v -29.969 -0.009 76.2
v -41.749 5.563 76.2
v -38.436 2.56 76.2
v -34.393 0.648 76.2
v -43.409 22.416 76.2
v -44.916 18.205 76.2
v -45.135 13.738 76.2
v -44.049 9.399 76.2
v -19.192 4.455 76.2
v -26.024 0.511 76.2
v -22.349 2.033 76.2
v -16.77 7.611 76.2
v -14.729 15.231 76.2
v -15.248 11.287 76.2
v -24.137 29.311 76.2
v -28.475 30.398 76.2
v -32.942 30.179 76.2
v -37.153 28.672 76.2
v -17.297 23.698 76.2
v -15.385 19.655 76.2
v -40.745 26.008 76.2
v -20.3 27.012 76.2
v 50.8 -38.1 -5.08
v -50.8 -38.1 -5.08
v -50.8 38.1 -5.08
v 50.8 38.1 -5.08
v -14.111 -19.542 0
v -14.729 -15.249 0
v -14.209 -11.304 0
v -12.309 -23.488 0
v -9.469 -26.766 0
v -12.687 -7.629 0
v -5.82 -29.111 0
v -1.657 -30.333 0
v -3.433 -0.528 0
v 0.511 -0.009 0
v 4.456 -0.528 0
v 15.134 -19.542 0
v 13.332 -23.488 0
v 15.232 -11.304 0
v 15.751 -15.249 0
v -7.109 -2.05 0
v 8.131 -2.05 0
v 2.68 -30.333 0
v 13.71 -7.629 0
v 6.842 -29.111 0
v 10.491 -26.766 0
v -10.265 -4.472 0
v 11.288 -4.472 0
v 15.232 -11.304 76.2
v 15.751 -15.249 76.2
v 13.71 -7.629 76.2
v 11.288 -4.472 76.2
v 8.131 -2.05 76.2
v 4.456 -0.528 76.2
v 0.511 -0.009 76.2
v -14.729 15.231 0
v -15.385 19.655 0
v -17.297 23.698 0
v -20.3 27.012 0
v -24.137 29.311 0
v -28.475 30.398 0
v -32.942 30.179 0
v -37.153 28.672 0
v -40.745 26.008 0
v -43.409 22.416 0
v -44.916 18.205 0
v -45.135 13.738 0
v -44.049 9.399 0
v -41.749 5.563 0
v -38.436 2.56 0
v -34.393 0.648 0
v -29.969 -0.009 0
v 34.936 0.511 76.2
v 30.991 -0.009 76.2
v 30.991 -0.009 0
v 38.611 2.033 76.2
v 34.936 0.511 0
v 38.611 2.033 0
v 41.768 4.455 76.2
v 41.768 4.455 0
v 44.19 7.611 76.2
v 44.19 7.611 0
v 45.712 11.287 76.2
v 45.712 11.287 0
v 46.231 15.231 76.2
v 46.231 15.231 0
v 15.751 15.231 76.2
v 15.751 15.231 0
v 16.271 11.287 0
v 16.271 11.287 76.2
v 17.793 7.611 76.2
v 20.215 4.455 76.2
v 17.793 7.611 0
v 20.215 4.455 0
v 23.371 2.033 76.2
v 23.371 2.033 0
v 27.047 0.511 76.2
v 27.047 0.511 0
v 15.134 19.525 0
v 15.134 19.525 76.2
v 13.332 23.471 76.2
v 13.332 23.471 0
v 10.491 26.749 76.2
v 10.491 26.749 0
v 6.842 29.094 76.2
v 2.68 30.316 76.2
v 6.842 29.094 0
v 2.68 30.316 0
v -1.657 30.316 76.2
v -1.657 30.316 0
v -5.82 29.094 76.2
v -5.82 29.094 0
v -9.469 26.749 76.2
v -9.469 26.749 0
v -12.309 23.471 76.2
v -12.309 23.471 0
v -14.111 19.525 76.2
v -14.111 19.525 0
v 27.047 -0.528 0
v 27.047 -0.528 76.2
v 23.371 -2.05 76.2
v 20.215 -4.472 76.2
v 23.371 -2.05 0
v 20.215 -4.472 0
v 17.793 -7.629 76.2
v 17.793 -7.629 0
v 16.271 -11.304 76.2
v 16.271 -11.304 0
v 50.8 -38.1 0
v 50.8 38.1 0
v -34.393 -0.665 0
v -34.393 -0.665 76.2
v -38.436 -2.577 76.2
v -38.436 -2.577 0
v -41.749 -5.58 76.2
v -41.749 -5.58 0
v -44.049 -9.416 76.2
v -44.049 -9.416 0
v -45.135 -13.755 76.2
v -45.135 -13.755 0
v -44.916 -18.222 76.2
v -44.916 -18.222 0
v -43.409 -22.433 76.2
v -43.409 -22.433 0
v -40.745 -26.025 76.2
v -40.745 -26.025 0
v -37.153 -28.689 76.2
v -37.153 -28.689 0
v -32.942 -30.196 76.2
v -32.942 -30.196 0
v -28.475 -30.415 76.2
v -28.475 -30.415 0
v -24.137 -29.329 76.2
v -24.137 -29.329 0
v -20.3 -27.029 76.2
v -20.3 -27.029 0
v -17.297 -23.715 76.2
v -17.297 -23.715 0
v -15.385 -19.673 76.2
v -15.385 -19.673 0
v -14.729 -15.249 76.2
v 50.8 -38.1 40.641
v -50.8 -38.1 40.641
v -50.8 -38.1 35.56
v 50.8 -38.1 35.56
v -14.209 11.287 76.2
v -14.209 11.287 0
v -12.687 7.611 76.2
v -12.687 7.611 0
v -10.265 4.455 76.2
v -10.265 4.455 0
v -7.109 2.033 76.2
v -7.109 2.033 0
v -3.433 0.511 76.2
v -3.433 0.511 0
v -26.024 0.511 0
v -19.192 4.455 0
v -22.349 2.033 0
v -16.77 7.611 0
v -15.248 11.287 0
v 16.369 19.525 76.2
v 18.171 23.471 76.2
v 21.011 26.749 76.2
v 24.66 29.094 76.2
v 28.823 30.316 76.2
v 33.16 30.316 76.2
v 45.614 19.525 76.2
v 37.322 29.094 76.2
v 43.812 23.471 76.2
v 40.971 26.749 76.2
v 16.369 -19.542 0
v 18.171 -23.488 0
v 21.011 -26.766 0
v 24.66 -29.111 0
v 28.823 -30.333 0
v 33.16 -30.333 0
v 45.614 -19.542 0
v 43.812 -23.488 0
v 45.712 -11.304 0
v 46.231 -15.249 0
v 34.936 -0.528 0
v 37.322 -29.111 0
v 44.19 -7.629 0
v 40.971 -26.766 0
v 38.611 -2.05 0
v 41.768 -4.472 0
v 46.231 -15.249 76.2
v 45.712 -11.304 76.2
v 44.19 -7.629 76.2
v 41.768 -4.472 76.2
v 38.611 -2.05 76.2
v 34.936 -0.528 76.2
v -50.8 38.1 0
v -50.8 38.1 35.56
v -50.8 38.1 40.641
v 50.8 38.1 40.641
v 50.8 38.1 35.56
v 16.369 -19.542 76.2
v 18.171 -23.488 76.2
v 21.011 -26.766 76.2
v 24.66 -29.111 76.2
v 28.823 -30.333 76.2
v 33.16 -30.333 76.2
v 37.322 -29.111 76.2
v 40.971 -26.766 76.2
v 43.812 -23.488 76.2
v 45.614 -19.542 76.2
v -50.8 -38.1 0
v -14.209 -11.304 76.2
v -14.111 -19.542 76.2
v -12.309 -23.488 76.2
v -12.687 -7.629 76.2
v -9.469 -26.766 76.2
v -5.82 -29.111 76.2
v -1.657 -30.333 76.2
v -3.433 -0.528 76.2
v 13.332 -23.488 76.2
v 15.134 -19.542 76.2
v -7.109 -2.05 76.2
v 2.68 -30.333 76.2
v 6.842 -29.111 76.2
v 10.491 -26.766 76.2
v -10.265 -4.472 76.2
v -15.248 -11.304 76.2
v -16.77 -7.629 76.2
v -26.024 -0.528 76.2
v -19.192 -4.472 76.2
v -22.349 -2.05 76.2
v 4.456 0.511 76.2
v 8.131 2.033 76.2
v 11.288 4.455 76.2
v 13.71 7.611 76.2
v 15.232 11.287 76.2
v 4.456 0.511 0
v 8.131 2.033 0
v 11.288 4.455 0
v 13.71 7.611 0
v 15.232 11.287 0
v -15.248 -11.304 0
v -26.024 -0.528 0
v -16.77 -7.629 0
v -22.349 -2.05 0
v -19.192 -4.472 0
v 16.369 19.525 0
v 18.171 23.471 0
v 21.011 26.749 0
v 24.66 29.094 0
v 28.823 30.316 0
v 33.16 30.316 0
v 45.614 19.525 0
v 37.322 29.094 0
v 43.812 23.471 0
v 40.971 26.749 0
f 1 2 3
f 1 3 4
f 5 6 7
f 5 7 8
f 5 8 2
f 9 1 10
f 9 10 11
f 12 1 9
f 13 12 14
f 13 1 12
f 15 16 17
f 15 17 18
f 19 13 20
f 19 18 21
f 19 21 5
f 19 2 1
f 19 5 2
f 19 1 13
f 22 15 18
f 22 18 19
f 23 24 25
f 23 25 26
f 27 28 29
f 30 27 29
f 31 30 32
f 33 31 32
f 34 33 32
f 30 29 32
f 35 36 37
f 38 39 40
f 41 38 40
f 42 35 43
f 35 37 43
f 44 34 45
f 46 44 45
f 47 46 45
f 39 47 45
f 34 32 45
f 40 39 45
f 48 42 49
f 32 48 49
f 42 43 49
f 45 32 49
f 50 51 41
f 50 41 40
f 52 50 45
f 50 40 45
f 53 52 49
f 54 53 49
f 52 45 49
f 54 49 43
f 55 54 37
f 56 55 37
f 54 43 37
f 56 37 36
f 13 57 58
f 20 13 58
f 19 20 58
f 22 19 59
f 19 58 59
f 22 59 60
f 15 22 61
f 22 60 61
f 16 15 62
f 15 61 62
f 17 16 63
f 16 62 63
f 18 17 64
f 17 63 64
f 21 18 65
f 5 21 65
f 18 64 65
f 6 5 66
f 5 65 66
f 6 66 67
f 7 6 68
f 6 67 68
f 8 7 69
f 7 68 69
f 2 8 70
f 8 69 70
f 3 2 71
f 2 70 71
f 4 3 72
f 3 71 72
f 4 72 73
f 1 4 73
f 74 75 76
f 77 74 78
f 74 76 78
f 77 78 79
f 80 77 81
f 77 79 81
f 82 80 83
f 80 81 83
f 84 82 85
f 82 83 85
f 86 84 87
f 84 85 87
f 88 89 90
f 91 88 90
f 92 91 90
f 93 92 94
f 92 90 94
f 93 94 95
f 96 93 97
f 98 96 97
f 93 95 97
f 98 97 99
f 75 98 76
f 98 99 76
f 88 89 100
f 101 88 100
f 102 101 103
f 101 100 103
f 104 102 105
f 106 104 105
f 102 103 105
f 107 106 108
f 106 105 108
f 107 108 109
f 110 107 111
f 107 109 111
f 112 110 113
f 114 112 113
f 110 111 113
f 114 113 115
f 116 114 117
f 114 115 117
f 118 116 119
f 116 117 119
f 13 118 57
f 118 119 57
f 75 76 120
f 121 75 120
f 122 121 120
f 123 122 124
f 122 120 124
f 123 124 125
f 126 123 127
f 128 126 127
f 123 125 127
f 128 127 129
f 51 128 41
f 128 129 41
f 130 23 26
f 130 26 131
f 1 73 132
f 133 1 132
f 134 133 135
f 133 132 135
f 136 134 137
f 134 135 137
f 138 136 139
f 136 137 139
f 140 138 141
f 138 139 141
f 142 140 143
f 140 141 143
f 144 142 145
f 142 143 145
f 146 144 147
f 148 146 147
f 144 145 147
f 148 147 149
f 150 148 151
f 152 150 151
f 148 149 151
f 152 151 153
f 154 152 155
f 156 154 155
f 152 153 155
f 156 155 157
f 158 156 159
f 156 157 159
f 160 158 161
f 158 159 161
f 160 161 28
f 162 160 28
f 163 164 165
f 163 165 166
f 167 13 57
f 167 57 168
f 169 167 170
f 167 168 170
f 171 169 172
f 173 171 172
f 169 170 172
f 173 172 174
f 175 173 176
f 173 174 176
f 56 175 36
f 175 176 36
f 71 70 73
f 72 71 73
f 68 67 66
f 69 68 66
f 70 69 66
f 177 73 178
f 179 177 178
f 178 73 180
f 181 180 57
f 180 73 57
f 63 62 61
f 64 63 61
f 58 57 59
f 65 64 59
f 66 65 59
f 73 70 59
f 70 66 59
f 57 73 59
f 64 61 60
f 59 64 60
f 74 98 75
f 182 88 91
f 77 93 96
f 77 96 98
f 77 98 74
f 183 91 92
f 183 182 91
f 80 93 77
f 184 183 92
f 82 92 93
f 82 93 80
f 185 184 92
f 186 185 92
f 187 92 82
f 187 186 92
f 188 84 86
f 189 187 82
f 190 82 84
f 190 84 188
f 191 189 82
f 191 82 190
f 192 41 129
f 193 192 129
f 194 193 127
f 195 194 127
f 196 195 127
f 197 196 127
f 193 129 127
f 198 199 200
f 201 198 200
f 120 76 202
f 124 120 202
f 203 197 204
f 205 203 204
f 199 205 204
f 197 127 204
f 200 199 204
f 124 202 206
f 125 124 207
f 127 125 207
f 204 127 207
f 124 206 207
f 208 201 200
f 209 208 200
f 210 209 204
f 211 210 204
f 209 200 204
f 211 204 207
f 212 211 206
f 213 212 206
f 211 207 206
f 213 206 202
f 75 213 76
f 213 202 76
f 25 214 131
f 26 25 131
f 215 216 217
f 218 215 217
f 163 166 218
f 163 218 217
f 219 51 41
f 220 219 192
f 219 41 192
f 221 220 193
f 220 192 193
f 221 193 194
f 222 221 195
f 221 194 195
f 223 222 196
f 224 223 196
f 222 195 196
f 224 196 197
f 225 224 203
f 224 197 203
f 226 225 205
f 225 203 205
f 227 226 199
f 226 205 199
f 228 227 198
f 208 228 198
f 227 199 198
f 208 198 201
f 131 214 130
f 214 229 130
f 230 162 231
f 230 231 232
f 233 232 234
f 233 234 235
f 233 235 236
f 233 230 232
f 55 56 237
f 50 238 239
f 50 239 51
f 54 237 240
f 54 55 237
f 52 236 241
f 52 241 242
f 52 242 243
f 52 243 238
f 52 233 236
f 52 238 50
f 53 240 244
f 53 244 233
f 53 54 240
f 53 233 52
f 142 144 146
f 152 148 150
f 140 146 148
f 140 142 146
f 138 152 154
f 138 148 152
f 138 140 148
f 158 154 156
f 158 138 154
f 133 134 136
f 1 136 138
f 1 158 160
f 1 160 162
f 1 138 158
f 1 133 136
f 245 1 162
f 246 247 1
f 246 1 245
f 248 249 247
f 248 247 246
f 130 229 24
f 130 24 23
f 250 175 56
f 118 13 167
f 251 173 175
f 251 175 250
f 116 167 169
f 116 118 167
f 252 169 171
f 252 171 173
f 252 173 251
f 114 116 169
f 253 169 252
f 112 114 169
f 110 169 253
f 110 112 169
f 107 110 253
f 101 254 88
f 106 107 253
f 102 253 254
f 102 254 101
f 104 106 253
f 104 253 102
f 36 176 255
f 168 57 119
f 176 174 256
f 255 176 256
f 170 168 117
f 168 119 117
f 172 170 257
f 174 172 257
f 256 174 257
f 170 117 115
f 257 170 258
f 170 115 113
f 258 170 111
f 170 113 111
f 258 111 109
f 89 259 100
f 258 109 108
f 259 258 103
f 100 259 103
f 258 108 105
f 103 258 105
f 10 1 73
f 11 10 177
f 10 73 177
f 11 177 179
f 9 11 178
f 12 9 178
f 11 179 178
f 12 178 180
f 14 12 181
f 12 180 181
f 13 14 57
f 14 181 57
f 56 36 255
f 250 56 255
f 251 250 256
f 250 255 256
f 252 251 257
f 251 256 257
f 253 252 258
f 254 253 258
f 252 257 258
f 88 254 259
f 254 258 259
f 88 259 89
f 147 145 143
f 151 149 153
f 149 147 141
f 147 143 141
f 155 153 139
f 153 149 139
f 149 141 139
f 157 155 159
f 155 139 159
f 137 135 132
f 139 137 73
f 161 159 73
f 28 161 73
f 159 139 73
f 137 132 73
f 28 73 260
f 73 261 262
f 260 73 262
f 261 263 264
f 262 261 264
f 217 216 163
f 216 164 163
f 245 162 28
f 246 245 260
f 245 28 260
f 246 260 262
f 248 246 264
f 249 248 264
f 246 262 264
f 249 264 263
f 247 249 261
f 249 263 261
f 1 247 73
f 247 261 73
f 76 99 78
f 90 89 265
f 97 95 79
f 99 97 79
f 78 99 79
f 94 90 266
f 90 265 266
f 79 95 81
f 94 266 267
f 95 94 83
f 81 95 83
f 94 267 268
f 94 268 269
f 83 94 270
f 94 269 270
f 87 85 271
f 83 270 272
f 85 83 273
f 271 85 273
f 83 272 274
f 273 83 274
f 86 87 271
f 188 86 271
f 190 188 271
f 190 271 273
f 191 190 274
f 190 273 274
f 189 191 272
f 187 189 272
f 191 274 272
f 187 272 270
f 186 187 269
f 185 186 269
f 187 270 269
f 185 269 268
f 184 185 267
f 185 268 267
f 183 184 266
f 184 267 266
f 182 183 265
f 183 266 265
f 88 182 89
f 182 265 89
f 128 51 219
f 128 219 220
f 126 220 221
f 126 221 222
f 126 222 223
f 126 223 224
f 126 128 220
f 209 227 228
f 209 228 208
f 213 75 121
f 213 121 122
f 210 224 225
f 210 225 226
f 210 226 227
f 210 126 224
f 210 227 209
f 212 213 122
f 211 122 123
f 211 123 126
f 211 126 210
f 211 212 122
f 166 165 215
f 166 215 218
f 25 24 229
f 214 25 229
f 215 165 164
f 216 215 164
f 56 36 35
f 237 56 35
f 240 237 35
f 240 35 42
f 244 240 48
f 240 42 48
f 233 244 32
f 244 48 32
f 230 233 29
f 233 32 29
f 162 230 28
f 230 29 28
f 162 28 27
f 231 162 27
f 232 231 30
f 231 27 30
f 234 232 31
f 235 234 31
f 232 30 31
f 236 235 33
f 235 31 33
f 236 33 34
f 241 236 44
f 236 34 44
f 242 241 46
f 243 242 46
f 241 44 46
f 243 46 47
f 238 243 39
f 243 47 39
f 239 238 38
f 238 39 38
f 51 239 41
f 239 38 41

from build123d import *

# Parameters (mm, degrees)
F1_DEPTH = 76.2
F2_W     = 101.6
F2_H     = 5.08
F3_DEPTH = 38.1
F2_H_2   = 5.0807343126


# Not quite as in the source:
# - a feature names something its author has since deleted; it is built from what else it names


with BuildPart() as f1:
    # F0 (on Top) → F1 (new body)
    with BuildSketch(Plane.XY):
        with BuildLine():
            ThreePointArc((-29.9686177893, -0.0085821988), (-40.7449251346, -26.0248895441), (-14.7286177893, -15.2485821988))
            ThreePointArc((-14.7286177893, -15.2485821988), (-19.192310444, -4.4722748535), (-29.9686177893, -0.0085821988))
        make_face()
    extrude(amount=F1_DEPTH)


with BuildPart() as f1b:
    # F0 (on Top) → F1, piece 2 (new body)
    with BuildSketch(Plane.XY):
        with BuildLine():
            ThreePointArc((0.5113822094, -0.0085821988), (-10.264925135, -4.472274854), (-14.7286177893, -15.2485821988))
            ThreePointArc((-14.7286177893, -15.2485821988), (0.5113822107, -30.4885821988), (15.7513822107, -15.2485821988))
            ThreePointArc((15.7513822107, -15.2485821988), (11.2876895555, -4.4722748531), (0.5113822094, -0.0085821988))
        make_face()
    extrude(amount=F1_DEPTH)


with BuildPart() as f1c:
    # F0 (on Top) → F1, piece 3 (new body)
    with BuildSketch(Plane.XY):
        with BuildLine():
            ThreePointArc((-14.7286177893, 15.2314178012), (-40.7449251346, 26.0077251465), (-29.9686177893, -0.0085821988))
            ThreePointArc((-29.9686177893, -0.0085821988), (-19.192310444, 4.4551104559), (-14.7286177893, 15.2314178012))
        make_face()
    extrude(amount=F1_DEPTH)


with BuildPart() as f1d:
    # F0 (on Top) → F1, piece 4 (new body)
    with BuildSketch(Plane.XY):
        with BuildLine():
            ThreePointArc((30.9913822354, -0.0085821988), (20.2150748742, -4.4722748448), (15.7513822107, -15.2485821988))
            ThreePointArc((15.7513822107, -15.2485821988), (30.9913822107, -30.4885821988), (46.2313822107, -15.2485821988))
            ThreePointArc((46.2313822107, -15.2485821988), (41.7676895647, -4.4722748623), (30.9913822354, -0.0085821988))
        make_face()
    extrude(amount=F1_DEPTH)


with BuildPart() as f1e:
    # F0 (on Top) → F1, piece 5 (new body)
    with BuildSketch(Plane.XY):
        with BuildLine():
            ThreePointArc((-14.7286177893, 15.2314178012), (-10.264925135, 4.4551104564), (0.5113822094, -0.0085821988))
            ThreePointArc((0.5113822094, -0.0085821988), (11.2876895555, 4.4551104555), (15.7513822107, 15.2314178012))
            ThreePointArc((15.7513822107, 15.2314178012), (0.5113822107, 30.4714178012), (-14.7286177893, 15.2314178012))
        make_face()
    extrude(amount=F1_DEPTH)


with BuildPart() as f1f:
    # F0 (on Top) → F1, piece 6 (new body)
    with BuildSketch(Plane.XY):
        with BuildLine():
            ThreePointArc((15.7513822107, 15.2314178012), (20.2150748742, 4.4551104472), (30.9913822354, -0.0085821988))
            ThreePointArc((30.9913822354, -0.0085821988), (41.7676895647, 4.4551104647), (46.2313822107, 15.2314178012))
            ThreePointArc((46.2313822107, 15.2314178012), (30.9913822107, 30.4714178012), (15.7513822107, 15.2314178012))
        make_face()
    extrude(amount=F1_DEPTH)


with BuildPart() as f3:
    # F2 (on Front) → F3 (new body, symmetric)
    with BuildSketch(Plane.XZ):
        with Locations((0, -2.54)):
            Rectangle(F2_W, F2_H)
    extrude(amount=F3_DEPTH, both=True)


with BuildPart() as f3b:
    # F2 (on Front) → F3, piece 2 (new body, symmetric)
    with BuildSketch(Plane.XZ):
        with Locations((0, 38.1003671563)):
            Rectangle(F2_W, F2_H_2)
    extrude(amount=F3_DEPTH, both=True)


solid = Compound([f1.part, f1b.part, f1c.part, f1d.part, f1e.part, f1f.part, f3.part, f3b.part])
